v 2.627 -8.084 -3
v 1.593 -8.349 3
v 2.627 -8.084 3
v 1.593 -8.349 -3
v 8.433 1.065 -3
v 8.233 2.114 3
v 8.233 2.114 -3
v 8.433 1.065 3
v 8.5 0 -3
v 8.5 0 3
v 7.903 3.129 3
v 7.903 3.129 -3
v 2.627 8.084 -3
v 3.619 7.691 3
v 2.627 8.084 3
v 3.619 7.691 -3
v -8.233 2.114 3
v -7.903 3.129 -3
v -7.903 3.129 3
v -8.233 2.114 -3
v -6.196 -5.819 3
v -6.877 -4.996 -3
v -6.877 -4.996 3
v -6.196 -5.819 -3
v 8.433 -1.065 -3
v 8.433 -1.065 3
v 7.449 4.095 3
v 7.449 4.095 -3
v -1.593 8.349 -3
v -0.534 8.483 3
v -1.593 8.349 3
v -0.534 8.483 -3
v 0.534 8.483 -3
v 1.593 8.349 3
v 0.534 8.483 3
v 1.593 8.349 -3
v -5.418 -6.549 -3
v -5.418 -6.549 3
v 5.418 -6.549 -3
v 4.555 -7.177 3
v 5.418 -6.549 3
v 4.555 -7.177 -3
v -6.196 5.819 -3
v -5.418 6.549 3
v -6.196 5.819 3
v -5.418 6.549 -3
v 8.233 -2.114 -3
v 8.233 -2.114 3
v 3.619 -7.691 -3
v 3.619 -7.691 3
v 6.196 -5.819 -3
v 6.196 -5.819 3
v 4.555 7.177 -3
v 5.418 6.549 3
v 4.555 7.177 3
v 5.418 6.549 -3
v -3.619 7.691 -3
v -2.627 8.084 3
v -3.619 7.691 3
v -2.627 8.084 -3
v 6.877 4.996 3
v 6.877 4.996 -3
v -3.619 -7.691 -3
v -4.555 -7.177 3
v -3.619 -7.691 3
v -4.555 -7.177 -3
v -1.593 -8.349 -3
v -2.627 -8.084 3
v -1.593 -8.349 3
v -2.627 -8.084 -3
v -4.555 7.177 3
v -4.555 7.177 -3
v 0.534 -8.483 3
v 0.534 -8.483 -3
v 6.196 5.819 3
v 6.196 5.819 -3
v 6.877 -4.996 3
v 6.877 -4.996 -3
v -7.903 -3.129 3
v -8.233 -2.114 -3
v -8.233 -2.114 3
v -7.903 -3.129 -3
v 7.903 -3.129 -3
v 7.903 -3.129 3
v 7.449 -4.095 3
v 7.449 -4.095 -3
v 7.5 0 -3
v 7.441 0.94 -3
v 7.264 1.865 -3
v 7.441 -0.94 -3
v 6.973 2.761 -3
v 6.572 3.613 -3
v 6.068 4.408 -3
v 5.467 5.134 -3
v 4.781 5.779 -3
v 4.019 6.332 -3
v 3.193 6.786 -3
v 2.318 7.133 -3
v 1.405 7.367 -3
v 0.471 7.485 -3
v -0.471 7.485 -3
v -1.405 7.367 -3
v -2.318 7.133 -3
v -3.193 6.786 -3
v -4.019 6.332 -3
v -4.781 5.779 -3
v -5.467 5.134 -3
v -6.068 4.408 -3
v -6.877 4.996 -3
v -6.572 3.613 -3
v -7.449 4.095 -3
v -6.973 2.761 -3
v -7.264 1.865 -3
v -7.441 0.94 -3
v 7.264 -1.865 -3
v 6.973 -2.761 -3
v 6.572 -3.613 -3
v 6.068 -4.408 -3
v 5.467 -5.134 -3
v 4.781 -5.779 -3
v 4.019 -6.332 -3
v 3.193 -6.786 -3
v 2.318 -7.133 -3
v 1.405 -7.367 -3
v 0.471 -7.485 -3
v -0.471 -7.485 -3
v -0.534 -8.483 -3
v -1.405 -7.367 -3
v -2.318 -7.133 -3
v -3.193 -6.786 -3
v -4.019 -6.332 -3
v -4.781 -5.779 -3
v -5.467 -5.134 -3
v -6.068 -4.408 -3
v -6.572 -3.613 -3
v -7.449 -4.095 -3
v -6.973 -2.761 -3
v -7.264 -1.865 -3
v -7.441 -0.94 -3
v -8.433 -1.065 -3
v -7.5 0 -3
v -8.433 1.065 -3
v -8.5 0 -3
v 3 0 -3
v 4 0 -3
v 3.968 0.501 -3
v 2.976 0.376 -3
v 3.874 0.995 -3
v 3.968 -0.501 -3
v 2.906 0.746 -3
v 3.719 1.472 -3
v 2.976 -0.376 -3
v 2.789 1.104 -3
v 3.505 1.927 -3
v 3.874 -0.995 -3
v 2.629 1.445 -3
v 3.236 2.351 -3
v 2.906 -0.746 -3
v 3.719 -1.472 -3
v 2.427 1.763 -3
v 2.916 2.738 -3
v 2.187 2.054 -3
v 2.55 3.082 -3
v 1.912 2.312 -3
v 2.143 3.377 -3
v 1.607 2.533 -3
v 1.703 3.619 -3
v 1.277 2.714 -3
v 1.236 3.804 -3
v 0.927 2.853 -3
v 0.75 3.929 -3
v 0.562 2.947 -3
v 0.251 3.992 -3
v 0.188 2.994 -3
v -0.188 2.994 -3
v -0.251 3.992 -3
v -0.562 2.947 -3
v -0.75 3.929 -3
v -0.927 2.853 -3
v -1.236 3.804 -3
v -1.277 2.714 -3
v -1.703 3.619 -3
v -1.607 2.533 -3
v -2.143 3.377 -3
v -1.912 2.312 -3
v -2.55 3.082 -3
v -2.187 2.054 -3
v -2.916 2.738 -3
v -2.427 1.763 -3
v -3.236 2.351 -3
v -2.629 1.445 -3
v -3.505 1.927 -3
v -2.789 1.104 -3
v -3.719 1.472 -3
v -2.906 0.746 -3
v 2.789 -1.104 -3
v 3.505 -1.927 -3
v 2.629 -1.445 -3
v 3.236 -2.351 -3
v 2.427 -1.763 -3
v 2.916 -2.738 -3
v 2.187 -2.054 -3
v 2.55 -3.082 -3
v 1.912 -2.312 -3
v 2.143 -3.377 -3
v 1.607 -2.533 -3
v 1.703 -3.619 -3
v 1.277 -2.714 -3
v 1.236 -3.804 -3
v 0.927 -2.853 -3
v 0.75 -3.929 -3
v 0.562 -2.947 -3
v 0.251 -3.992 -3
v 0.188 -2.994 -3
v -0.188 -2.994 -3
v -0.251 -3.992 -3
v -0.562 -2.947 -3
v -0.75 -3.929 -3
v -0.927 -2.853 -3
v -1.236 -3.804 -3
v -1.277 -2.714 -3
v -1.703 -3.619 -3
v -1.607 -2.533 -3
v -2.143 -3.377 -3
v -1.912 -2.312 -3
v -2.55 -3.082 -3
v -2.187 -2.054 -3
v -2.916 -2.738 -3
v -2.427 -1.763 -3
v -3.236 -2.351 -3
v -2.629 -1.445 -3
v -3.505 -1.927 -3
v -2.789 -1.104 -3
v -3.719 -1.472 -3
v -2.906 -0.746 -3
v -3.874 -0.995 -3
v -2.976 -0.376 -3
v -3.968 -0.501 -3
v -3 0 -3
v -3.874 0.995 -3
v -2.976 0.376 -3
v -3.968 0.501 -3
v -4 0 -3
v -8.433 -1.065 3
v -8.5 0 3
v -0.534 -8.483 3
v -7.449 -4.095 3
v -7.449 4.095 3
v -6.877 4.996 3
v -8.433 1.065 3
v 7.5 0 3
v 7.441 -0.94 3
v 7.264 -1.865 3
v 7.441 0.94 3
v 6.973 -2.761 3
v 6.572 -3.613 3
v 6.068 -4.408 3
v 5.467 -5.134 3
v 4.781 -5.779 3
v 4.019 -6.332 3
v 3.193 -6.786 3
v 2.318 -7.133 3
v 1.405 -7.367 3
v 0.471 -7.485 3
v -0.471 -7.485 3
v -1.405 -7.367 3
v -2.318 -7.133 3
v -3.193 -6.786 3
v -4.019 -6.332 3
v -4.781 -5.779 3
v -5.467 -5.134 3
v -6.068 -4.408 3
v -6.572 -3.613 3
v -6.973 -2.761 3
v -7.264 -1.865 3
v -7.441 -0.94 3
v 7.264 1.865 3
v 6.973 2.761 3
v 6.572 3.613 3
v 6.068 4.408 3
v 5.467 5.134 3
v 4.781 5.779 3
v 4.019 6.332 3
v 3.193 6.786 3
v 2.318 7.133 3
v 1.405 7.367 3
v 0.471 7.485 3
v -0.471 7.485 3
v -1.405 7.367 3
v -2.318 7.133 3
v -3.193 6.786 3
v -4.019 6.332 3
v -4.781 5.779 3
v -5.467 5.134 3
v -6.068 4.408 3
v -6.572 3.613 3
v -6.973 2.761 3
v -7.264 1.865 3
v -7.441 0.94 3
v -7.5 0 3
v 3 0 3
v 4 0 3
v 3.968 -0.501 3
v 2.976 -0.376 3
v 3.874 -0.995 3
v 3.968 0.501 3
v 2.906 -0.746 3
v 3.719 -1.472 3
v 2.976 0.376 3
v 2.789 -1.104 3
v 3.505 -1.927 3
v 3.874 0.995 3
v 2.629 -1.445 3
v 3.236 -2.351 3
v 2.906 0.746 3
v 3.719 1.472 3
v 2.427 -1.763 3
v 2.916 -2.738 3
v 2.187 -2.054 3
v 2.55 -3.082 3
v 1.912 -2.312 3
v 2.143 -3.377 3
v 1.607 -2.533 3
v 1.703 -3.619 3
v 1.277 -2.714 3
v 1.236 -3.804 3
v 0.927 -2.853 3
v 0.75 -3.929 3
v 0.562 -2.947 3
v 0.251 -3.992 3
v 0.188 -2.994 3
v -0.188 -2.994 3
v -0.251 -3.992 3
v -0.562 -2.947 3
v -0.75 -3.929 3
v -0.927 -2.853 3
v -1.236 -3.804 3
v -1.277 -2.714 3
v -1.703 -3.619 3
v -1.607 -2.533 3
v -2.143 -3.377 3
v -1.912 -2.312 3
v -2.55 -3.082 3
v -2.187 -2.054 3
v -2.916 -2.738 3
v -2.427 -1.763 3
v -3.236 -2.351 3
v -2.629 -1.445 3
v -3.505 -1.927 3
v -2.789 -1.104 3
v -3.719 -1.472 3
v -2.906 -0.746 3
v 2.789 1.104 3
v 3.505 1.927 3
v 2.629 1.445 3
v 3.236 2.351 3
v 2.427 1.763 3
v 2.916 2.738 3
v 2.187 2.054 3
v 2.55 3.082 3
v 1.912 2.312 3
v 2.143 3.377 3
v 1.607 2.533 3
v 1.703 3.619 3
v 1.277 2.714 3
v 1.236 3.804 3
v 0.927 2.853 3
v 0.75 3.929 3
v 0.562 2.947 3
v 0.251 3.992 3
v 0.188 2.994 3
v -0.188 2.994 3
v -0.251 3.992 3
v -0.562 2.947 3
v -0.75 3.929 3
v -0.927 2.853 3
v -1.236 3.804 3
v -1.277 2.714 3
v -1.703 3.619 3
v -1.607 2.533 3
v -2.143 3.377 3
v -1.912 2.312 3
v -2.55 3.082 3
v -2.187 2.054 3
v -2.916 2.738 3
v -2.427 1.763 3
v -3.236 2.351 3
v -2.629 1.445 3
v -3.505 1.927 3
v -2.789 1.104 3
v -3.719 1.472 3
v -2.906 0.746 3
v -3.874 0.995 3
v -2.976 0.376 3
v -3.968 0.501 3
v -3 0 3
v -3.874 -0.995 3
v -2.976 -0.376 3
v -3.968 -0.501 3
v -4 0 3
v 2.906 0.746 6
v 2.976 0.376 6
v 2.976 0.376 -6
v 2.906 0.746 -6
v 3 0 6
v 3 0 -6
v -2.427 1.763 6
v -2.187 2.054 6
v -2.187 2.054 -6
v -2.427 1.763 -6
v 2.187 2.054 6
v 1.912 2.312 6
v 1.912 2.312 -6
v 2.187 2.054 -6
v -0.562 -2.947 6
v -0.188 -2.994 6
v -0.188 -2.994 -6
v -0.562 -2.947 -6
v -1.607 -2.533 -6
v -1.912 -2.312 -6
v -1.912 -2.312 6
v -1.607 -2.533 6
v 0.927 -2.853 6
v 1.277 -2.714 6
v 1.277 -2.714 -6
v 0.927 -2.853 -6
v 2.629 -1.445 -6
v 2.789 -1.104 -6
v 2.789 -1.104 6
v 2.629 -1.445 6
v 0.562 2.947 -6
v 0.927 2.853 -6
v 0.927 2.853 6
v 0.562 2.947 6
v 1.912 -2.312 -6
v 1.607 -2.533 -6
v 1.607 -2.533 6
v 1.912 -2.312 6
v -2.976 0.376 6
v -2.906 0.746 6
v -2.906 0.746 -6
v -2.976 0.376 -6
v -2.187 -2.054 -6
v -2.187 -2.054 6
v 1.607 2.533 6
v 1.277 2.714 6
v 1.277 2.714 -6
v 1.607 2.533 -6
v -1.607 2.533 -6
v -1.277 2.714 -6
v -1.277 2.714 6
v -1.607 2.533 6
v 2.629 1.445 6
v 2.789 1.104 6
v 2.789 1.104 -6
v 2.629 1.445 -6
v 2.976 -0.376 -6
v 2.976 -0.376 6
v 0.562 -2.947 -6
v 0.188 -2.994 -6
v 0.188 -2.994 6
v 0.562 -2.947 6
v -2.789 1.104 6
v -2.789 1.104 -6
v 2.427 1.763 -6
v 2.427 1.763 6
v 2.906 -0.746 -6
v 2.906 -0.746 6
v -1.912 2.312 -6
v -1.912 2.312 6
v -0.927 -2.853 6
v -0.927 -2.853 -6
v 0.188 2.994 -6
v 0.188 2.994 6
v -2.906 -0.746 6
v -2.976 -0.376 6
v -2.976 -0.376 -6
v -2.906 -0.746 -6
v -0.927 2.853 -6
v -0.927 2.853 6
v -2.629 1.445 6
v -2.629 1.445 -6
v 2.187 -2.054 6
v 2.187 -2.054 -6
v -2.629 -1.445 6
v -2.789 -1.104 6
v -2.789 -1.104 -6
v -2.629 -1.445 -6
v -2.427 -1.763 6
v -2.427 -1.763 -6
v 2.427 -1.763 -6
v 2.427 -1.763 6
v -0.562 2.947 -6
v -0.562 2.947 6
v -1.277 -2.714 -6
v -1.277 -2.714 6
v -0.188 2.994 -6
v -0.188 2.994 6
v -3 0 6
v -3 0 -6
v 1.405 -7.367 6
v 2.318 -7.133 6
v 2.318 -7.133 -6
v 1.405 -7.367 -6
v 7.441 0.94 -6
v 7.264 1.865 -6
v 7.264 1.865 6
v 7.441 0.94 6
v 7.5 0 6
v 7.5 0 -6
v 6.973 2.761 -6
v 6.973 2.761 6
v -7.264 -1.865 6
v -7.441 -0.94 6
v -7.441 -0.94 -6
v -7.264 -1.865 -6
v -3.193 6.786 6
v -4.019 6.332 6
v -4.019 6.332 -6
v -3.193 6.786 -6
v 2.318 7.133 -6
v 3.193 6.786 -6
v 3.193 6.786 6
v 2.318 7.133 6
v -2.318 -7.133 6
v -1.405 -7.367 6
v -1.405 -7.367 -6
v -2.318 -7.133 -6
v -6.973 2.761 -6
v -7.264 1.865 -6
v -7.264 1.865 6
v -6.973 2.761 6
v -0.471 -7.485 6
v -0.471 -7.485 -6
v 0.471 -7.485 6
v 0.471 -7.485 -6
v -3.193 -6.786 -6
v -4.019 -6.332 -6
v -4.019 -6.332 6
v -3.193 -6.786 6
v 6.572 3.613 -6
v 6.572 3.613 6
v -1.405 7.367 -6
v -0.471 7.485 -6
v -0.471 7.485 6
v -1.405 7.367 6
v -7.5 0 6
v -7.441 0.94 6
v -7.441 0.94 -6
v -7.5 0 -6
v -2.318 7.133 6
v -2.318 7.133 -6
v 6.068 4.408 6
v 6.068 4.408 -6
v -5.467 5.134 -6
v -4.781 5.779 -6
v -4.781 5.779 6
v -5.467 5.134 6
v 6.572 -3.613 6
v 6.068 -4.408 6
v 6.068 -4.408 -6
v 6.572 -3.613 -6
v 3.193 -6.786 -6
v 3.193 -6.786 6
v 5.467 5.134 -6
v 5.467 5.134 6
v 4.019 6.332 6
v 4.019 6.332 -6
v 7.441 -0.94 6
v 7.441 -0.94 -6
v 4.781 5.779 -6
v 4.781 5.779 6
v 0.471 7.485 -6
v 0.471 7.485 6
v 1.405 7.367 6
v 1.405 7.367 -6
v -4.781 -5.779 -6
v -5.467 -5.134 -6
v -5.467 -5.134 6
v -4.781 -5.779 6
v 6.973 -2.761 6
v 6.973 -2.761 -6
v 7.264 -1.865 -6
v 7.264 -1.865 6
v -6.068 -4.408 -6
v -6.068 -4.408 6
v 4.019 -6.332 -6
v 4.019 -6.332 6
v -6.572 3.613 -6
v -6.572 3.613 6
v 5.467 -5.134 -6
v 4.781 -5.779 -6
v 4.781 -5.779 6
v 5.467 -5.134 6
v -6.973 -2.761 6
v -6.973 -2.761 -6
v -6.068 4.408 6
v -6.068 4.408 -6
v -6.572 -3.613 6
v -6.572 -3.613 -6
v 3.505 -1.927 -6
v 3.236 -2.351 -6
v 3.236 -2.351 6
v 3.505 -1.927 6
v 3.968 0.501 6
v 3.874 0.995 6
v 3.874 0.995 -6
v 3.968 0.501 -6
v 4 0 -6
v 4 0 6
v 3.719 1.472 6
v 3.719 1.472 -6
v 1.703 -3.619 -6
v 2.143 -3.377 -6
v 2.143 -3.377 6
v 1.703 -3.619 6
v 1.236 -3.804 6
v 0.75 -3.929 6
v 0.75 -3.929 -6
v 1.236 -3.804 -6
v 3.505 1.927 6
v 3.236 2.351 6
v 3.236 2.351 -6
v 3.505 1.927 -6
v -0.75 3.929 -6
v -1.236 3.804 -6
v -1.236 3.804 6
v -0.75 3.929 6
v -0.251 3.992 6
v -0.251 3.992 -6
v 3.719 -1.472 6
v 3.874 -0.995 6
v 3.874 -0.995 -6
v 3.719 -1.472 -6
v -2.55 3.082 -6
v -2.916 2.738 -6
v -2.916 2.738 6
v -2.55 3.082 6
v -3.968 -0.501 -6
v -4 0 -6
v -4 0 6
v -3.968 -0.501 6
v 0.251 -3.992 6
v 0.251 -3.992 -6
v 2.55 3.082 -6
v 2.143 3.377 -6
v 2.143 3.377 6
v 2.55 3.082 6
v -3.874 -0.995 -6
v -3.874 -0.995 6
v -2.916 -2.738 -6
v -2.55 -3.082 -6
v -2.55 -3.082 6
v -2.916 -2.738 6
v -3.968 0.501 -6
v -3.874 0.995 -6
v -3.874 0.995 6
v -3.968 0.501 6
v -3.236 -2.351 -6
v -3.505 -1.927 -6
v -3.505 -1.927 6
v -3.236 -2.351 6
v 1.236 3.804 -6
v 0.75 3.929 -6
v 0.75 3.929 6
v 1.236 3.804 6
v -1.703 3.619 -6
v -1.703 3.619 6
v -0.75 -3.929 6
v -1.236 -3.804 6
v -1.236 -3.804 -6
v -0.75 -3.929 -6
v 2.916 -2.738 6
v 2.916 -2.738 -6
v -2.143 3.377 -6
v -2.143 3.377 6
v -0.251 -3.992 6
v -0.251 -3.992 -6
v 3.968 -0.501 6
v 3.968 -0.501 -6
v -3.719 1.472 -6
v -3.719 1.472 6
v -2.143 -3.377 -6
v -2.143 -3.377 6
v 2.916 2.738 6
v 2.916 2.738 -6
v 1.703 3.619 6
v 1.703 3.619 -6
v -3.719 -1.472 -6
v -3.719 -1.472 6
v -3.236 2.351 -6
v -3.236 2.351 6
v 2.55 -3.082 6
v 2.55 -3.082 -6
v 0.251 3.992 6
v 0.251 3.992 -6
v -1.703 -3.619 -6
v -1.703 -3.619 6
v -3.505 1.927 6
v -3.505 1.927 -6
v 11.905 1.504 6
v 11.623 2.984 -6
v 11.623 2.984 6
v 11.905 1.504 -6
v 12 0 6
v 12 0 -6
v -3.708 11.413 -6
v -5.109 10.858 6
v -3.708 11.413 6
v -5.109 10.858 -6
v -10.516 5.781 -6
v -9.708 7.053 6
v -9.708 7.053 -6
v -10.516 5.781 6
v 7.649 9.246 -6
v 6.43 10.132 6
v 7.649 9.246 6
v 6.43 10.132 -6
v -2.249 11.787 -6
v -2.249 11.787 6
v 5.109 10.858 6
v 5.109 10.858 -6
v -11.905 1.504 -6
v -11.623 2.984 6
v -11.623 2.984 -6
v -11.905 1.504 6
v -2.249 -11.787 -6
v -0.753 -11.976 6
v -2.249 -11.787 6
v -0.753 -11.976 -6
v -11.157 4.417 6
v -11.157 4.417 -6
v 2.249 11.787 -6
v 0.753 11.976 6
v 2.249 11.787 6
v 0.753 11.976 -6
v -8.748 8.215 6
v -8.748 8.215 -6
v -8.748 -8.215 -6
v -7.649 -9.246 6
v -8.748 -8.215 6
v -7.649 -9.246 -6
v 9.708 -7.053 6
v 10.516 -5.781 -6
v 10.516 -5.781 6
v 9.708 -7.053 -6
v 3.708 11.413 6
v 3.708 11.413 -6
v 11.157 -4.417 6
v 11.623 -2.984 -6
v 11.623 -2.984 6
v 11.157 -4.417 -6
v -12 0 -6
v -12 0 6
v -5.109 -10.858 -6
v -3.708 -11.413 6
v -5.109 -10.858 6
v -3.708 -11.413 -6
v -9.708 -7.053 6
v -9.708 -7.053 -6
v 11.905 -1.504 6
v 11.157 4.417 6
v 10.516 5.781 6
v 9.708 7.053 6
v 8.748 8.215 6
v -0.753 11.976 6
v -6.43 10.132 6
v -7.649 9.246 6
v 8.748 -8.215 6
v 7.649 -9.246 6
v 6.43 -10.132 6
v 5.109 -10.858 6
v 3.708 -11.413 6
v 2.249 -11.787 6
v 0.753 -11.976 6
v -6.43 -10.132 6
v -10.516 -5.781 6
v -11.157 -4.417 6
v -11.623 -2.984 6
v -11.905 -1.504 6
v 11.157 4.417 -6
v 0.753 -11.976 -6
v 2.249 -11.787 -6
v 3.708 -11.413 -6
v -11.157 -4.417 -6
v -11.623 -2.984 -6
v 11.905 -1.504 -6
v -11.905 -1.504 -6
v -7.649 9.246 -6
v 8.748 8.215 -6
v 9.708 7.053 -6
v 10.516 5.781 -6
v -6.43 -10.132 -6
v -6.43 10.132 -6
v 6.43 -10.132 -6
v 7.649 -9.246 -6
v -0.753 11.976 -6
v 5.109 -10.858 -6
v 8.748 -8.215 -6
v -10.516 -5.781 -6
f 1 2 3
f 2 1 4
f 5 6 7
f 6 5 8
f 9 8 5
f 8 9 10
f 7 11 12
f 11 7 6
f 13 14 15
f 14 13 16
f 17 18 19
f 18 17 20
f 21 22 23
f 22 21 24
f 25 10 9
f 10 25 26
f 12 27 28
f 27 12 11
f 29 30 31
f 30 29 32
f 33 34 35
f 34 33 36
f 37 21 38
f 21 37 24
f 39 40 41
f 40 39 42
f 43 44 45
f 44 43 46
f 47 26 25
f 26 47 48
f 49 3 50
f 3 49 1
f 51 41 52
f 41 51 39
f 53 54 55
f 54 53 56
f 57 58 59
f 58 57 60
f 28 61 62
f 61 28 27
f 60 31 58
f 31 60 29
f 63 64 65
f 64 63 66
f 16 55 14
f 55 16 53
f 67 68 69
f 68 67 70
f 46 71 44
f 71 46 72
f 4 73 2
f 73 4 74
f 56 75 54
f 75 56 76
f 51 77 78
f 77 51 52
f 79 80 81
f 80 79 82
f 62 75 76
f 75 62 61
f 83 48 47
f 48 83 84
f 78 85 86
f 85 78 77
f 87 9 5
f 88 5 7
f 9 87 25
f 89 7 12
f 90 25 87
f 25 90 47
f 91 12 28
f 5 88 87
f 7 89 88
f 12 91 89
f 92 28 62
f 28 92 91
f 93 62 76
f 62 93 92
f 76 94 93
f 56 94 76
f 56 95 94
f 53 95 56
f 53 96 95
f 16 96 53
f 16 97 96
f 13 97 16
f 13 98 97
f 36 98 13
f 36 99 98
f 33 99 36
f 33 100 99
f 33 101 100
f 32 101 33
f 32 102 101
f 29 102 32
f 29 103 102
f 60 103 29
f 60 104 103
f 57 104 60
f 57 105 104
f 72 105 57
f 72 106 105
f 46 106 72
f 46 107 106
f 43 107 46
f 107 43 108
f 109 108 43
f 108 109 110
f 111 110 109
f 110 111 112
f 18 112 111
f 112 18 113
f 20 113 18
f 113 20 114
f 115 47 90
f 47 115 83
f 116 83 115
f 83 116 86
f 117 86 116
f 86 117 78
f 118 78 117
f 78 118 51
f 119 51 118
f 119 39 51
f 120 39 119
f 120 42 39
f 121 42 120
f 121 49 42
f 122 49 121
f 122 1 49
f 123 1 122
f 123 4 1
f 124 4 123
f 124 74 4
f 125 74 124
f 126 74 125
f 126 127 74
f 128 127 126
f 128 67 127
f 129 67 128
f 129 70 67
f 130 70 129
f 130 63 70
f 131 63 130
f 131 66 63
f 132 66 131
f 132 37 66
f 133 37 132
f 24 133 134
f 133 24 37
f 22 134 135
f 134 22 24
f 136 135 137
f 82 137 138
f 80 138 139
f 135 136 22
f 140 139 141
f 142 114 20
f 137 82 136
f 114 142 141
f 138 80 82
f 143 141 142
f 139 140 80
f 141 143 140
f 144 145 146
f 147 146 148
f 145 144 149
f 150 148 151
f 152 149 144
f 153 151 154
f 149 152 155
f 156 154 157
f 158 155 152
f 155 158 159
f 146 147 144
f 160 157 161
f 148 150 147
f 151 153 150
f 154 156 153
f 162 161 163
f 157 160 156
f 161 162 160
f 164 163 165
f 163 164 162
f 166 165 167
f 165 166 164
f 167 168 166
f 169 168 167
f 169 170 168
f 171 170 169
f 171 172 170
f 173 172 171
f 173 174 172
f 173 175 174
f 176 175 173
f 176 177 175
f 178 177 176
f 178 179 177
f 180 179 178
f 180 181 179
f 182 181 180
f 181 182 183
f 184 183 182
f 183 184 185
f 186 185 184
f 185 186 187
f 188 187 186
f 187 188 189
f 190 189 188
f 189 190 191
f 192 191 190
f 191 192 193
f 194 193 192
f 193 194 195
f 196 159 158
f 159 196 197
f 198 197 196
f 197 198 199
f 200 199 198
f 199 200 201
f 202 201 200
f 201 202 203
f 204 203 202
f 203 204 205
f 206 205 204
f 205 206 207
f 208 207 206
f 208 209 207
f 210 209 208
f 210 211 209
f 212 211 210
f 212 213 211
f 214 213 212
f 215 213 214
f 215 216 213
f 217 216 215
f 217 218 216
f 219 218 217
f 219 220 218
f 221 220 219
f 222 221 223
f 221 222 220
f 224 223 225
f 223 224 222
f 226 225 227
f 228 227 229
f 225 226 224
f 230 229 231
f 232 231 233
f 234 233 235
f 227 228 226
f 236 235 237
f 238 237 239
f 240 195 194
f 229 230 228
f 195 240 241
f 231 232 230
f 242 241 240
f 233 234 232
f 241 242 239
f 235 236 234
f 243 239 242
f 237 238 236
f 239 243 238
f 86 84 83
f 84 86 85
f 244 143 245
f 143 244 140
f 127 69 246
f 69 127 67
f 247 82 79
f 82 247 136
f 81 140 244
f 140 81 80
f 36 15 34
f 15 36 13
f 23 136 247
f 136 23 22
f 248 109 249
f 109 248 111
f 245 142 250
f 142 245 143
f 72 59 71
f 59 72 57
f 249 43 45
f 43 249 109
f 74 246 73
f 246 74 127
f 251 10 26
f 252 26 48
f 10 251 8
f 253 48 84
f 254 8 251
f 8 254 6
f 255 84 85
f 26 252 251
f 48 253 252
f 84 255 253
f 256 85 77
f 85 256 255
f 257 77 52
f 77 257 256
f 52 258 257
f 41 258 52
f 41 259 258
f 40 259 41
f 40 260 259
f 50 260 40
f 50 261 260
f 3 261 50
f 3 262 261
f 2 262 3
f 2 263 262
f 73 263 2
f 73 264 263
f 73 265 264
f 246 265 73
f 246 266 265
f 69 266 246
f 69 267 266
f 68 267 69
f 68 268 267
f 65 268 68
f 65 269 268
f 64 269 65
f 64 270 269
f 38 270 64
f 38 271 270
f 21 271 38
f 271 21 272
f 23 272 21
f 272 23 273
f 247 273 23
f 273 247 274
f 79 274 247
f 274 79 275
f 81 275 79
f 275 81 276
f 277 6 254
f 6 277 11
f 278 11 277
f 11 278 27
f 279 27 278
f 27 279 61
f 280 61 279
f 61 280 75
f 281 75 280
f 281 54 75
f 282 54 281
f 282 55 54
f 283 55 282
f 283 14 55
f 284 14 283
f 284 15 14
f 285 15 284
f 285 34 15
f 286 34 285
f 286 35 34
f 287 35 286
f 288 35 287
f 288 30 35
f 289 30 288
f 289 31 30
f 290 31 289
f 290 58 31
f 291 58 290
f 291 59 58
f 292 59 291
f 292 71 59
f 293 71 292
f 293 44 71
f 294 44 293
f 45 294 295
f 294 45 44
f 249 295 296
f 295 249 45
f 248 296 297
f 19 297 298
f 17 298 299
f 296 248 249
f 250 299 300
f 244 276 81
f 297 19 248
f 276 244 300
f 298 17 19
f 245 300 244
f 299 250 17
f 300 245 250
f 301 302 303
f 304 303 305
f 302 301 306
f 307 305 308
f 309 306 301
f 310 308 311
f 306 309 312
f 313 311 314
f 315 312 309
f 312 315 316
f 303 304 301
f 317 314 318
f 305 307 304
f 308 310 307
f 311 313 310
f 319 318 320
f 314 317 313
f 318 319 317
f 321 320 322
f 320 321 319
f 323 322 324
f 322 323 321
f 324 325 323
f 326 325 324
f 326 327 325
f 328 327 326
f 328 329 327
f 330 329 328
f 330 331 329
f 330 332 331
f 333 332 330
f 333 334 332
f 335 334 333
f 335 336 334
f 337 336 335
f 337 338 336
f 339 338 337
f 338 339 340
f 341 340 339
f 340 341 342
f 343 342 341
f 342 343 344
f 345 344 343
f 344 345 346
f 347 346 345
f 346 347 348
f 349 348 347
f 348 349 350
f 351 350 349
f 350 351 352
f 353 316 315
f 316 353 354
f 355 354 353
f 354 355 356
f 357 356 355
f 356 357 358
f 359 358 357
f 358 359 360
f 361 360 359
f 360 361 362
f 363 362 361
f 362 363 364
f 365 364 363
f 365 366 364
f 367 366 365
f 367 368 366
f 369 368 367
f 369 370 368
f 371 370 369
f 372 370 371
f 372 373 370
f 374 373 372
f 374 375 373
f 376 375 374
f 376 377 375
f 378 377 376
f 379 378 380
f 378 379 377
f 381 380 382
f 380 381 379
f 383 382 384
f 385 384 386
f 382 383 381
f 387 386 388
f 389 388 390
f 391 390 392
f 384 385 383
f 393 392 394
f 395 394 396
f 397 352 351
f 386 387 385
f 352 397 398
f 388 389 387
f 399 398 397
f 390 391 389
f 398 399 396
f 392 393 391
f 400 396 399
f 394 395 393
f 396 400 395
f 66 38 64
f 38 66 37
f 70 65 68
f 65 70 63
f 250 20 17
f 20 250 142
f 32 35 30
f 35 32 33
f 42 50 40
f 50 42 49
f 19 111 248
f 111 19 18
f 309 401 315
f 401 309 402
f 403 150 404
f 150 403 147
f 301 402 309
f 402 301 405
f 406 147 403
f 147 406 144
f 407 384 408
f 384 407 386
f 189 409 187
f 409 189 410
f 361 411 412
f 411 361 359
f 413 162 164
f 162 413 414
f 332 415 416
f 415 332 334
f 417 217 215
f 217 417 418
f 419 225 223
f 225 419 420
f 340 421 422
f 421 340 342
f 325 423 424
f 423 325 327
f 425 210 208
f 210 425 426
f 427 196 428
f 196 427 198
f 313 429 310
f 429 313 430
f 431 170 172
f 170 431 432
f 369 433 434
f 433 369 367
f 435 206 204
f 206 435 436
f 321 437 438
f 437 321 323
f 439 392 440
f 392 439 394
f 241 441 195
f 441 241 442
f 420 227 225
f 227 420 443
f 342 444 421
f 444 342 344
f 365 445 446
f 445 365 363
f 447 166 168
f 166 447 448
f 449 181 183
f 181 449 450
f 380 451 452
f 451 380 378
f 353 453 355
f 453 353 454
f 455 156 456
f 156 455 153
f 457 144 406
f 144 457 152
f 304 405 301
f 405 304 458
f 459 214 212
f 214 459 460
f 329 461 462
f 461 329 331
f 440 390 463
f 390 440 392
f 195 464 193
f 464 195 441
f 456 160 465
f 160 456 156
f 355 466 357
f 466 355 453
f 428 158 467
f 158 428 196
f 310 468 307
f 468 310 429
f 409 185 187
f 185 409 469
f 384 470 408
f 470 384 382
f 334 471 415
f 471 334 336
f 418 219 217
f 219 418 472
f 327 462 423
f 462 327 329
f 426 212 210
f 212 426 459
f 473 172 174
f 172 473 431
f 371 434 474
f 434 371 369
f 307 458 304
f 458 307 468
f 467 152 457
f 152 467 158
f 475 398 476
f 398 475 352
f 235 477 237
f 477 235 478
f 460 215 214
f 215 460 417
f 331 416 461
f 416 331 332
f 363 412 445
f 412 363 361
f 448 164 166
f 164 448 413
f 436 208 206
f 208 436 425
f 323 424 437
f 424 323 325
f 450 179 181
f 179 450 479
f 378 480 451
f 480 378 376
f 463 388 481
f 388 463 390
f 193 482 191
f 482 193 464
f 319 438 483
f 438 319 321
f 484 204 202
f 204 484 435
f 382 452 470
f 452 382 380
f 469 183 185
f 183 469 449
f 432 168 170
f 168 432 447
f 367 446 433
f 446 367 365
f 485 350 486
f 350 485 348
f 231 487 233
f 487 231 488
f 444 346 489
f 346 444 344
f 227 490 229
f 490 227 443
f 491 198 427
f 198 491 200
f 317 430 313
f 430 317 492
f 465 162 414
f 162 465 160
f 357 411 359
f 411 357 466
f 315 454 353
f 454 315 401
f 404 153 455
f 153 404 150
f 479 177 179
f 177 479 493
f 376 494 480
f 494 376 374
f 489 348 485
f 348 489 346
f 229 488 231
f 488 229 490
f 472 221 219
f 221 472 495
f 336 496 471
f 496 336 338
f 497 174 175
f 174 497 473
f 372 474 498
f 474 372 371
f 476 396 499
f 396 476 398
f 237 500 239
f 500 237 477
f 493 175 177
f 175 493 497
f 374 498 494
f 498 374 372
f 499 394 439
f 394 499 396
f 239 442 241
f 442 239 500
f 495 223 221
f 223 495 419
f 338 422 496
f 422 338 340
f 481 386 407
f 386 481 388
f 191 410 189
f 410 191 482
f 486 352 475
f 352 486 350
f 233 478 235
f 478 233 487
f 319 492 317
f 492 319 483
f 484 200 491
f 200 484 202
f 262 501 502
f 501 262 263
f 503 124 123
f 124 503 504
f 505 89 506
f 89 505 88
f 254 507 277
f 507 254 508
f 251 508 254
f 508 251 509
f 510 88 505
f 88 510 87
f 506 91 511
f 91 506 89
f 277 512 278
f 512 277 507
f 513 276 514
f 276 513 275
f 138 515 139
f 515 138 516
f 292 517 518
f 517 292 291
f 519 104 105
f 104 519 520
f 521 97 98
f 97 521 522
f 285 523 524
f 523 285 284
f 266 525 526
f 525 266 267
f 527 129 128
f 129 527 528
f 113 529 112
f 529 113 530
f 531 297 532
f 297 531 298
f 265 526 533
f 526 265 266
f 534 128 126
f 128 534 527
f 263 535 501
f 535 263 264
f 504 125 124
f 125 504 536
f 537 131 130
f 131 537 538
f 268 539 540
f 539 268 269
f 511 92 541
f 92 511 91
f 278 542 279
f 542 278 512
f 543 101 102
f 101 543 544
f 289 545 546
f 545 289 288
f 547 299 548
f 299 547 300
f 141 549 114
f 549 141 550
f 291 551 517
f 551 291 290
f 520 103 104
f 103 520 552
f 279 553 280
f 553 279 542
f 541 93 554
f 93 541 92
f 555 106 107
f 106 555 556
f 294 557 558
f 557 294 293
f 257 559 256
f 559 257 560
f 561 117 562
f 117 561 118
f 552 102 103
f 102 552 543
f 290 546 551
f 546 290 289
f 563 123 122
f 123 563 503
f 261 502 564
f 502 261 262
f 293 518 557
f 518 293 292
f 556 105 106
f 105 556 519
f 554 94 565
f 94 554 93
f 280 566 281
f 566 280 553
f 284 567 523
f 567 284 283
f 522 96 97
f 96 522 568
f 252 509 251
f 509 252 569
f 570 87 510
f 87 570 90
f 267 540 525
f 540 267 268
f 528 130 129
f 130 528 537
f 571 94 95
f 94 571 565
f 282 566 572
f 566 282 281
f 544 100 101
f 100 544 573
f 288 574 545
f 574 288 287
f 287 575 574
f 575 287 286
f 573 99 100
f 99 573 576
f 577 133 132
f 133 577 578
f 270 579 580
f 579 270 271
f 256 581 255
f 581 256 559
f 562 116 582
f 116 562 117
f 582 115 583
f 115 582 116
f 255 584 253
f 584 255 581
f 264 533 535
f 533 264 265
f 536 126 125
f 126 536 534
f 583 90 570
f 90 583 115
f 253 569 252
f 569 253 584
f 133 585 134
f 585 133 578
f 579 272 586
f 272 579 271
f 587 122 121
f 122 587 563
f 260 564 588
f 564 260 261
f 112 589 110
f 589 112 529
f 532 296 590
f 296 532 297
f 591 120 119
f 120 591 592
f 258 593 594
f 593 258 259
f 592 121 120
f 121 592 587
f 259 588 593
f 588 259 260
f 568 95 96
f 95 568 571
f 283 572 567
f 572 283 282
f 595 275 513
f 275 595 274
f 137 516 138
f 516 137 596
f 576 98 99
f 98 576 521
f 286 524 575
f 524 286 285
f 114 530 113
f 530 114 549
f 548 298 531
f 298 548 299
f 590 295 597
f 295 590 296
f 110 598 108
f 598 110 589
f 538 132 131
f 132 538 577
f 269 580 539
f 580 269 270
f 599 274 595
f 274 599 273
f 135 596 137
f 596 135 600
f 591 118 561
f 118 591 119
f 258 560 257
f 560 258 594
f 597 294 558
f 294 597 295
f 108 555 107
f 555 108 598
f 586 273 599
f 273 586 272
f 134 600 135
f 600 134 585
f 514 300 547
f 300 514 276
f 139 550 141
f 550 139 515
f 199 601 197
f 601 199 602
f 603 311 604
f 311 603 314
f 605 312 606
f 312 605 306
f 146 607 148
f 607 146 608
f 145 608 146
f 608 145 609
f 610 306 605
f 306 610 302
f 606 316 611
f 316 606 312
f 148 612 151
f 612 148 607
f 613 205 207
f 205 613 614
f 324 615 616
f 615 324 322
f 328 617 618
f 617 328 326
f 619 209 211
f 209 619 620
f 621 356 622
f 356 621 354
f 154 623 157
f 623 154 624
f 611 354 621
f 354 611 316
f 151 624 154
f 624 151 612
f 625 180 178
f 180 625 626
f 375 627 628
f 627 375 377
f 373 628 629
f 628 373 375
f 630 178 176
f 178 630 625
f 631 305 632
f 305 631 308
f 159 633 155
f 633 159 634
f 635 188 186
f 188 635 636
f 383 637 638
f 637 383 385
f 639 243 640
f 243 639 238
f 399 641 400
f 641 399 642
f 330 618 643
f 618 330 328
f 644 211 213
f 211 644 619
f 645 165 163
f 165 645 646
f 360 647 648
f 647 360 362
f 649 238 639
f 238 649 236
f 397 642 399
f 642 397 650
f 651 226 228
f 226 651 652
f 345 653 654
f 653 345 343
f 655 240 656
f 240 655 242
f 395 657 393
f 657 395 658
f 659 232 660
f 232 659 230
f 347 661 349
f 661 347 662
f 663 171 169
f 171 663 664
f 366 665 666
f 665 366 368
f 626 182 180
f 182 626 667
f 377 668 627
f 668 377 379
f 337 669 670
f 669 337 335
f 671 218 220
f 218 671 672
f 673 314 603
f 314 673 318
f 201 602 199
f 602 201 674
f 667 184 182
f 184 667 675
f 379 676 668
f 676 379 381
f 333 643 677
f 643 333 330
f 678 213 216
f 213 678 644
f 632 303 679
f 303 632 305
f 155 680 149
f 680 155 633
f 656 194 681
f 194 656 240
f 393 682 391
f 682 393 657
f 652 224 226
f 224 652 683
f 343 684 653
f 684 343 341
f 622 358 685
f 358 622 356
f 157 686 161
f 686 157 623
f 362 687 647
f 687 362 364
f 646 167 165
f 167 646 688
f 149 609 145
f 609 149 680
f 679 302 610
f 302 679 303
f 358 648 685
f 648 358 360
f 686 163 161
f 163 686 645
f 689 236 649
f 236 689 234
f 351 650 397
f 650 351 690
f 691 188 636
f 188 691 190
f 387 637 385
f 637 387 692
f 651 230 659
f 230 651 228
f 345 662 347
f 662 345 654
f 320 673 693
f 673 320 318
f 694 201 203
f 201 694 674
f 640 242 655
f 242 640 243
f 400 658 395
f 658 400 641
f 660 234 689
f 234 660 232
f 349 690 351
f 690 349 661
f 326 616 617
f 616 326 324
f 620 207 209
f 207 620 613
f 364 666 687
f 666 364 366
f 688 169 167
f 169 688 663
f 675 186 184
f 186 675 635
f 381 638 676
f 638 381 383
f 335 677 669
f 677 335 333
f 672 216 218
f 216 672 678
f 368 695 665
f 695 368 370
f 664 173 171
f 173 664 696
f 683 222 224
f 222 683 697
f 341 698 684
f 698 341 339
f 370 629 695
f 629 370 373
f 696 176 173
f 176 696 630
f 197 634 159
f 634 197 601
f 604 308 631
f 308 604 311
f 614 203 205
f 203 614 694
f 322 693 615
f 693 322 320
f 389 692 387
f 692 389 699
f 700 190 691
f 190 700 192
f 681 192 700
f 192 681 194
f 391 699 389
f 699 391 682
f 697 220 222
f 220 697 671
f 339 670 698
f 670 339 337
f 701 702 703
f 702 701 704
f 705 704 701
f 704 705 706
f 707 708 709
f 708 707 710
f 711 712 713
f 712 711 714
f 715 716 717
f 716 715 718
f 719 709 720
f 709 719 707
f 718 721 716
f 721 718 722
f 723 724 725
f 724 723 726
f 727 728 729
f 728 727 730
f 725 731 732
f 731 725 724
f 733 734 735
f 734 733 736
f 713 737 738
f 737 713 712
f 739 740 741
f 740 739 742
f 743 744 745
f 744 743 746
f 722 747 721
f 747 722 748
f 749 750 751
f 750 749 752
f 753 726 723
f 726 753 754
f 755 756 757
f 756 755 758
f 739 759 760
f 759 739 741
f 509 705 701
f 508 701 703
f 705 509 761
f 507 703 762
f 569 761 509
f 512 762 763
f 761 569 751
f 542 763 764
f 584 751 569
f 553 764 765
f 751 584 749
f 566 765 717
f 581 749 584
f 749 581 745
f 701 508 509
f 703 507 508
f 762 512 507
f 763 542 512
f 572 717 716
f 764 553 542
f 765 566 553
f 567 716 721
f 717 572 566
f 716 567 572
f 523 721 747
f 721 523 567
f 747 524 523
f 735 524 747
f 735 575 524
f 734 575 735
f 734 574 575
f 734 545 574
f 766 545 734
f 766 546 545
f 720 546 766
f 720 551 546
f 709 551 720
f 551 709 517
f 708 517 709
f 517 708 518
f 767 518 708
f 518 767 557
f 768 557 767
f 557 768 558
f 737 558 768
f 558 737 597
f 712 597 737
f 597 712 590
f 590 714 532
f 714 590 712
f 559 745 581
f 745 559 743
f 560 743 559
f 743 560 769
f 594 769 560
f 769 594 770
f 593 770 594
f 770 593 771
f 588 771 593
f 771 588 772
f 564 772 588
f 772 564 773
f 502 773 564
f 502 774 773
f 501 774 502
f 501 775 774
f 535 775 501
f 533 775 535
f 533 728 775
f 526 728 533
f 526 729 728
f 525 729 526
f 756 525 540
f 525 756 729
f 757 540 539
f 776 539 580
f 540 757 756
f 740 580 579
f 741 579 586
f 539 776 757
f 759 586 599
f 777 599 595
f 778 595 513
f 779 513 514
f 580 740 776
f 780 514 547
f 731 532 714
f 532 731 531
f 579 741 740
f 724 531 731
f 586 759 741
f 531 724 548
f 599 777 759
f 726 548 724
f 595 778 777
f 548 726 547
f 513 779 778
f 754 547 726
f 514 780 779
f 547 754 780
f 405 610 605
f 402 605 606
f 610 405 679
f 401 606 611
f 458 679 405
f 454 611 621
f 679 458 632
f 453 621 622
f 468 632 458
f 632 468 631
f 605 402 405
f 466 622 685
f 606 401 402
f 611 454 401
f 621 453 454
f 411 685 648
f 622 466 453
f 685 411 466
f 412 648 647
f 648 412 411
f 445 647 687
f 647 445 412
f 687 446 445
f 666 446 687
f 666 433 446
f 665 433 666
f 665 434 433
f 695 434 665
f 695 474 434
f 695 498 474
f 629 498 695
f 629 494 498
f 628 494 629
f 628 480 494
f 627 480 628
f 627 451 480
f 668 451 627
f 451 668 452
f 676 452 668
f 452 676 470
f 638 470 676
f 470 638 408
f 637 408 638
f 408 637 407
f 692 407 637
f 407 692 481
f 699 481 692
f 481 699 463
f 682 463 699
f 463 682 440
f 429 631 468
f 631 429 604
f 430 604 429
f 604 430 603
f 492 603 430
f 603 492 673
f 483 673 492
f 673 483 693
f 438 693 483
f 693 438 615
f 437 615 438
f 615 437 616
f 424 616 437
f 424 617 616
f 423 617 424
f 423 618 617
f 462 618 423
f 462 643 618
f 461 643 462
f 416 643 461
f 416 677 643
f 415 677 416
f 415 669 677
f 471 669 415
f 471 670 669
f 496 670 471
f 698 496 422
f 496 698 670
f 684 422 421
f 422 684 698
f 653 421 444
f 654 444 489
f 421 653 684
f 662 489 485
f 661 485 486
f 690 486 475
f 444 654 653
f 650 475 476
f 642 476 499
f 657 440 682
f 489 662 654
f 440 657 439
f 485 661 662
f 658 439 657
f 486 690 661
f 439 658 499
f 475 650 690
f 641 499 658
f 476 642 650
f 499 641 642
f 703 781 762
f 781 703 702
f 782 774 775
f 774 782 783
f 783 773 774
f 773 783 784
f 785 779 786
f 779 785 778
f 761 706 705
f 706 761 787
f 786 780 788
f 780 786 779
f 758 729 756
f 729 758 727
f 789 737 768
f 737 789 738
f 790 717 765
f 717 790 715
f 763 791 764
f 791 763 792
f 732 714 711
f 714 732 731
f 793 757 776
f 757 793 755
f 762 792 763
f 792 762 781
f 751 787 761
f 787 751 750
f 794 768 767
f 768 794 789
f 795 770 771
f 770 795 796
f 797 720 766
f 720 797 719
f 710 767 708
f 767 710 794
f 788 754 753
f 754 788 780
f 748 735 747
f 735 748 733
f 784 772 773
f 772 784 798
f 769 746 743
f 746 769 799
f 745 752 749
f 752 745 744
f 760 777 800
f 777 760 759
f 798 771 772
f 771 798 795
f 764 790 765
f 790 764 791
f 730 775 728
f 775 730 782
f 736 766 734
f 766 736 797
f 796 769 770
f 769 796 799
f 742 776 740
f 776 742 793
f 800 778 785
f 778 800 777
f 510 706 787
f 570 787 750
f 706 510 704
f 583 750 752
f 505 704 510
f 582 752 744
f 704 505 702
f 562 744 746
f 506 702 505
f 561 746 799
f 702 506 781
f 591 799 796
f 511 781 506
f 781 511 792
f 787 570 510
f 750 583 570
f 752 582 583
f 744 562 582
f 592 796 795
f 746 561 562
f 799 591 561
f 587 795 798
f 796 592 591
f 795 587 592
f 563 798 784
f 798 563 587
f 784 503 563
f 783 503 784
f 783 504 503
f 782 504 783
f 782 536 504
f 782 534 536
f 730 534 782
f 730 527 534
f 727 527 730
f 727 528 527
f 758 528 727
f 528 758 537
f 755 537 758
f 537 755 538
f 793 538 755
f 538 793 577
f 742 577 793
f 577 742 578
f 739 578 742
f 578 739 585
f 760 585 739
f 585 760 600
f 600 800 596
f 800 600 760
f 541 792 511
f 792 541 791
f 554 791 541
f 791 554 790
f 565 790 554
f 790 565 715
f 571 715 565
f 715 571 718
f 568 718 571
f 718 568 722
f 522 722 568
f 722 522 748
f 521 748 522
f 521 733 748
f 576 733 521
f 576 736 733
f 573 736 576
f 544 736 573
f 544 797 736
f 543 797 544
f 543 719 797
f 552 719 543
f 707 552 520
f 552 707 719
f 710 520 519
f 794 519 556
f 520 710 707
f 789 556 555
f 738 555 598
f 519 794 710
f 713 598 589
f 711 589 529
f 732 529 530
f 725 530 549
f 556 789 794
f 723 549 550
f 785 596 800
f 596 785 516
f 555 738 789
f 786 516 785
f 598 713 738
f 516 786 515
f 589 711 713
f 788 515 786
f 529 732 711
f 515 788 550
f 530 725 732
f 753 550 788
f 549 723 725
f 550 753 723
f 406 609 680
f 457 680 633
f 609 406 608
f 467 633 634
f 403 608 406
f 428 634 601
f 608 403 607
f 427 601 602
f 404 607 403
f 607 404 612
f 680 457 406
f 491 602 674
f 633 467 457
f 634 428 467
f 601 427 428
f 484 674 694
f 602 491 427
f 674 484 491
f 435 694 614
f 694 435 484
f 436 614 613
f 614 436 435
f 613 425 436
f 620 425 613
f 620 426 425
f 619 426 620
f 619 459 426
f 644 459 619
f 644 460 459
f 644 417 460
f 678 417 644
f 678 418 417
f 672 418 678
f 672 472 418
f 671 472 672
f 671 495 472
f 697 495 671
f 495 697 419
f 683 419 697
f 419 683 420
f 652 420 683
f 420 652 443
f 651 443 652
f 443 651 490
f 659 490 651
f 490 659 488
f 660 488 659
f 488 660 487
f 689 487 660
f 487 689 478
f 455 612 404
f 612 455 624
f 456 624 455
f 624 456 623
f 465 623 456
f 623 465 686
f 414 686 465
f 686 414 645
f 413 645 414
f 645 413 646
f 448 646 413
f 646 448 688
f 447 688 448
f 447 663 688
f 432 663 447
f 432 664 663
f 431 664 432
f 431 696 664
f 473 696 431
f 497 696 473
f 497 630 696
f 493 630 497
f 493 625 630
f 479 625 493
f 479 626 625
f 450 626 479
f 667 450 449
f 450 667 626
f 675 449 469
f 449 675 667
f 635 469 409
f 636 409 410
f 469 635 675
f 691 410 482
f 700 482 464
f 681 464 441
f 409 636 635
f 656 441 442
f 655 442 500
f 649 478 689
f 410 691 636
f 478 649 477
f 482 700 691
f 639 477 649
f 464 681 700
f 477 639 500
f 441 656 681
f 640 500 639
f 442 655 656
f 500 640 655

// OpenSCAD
$fn = 50;


difference() {
	union() {
		translate(v = [0, 0, -6.0000000000]) {
			rotate(a = [0, 0, 0]) {
				cylinder(h = 12, r = 12.0000000000);
			}
		}
	}
	union() {
		translate(v = [0, 0, 0]) {
			rotate(a = [0, 0, 0]) {
				translate(v = [0, 0, -3.0000000000]) {
					union() {
						difference() {
							translate(v = [0, 0, 0]) {
								rotate(a = [0, 0, 0]) {
									cylinder(h = 6, r = 8.5000000000);
								}
							}
							translate(v = [0, 0, 0]) {
								rotate(a = [0, 0, 0]) {
									cylinder(h = 6, r = 3.0000000000);
								}
							}
						}
						difference() {
							translate(v = [0, 0, -50]) {
								rotate(a = [0, 0, 0]) {
									cylinder(h = 100, r = 7.5000000000);
								}
							}
							translate(v = [0, 0, -50]) {
								rotate(a = [0, 0, 0]) {
									cylinder(h = 100, r = 4.0000000000);
								}
							}
						}
					}
				}
			}
		}
		translate(v = [-15.0000000000, -15.0000000000, -125.0000000000]) {
			rotate(a = [0, 0, 0]) {
				cylinder(h = 250, r = 3.0000000000);
			}
		}
		translate(v = [-15.0000000000, 15.0000000000, -125.0000000000]) {
			rotate(a = [0, 0, 0]) {
				cylinder(h = 250, r = 3.0000000000);
			}
		}
		translate(v = [15.0000000000, -15.0000000000, -125.0000000000]) {
			rotate(a = [0, 0, 0]) {
				cylinder(h = 250, r = 3.0000000000);
			}
		}
		translate(v = [15.0000000000, 15.0000000000, -125.0000000000]) {
			rotate(a = [0, 0, 0]) {
				cylinder(h = 250, r = 3.0000000000);
			}
		}
		translate(v = [0, 0, -125.0000000000]) {
			rotate(a = [0, 0, 0]) {
				cylinder(h = 250, r = 3.0000000000);
			}
		}
		translate(v = [15.0000000000, 0.0000000000, 4.3000000000]) {
			rotate(a = [0, 0, 15.0000000000]) {
				cylinder(h = 1.7000000000, r1 = 1.5000000000, r2 = 2.9000000000);
			}
		}
		translate(v = [15.0000000000, 0.0000000000, -6.0000000000]) {
			rotate(a = [0, 0, 15.0000000000]) {
				cylinder(h = 12, r = 1.5000000000);
			}
		}
		translate(v = [15.0000000000, 0.0000000000, -6.0000000000]) {
			rotate(a = [0, 0, 15.0000000000]) {
				translate(v = [0, 0, 0]) {
					rotate(a = [0, 0, 15.0000000000]) {
						linear_extrude(height = 2.5000000000) {
							polygon(points = [[3.1735000000, 0.0000000000], [1.5867500000, 2.7483316189], [-1.5867500000, 2.7483316189], [-3.1735000000, 0.0000000000], [-1.5867500000, -2.7483316189], [1.5867500000, -2.7483316189]]);
						}
					}
				}
			}
		}
		translate(v = [0.0000000000, -15.0000000000, -4.3000000000]) {
			rotate(a = [0, 180, 0]) {
				cylinder(h = 1.7000000000, r1 = 1.5000000000, r2 = 2.9000000000);
			}
		}
		translate(v = [0.0000000000, -15.0000000000, 6.0000000000]) {
			rotate(a = [0, 180, 0]) {
				cylinder(h = 12, r = 1.5000000000);
			}
		}
		translate(v = [0.0000000000, -15.0000000000, 3.0000000000]) {
			rotate(a = [0, 180, 0]) {
				translate(v = [0, 0, 0]) {
					rotate(a = [0, 180, 0]) {
						linear_extrude(height = 2.5000000000) {
							polygon(points = [[3.1735000000, 0.0000000000], [1.5867500000, 2.7483316189], [-1.5867500000, 2.7483316189], [-3.1735000000, 0.0000000000], [-1.5867500000, -2.7483316189], [1.5867500000, -2.7483316189]]);
						}
					}
				}
			}
		}
		translate(v = [-15.0000000000, 0.0000000000, 4.3000000000]) {
			rotate(a = [0, 0, 15.0000000000]) {
				cylinder(h = 1.7000000000, r1 = 1.5000000000, r2 = 2.9000000000);
			}
		}
		translate(v = [-15.0000000000, 0.0000000000, -6.0000000000]) {
			rotate(a = [0, 0, 15.0000000000]) {
				cylinder(h = 12, r = 1.5000000000);
			}
		}
		translate(v = [-15.0000000000, 0.0000000000, -6.0000000000]) {
			rotate(a = [0, 0, 15.0000000000]) {
				translate(v = [0, 0, 0]) {
					rotate(a = [0, 0, 15.0000000000]) {
						linear_extrude(height = 2.5000000000) {
							polygon(points = [[3.1735000000, 0.0000000000], [1.5867500000, 2.7483316189], [-1.5867500000, 2.7483316189], [-3.1735000000, 0.0000000000], [-1.5867500000, -2.7483316189], [1.5867500000, -2.7483316189]]);
						}
					}
				}
			}
		}
		translate(v = [0.0000000000, 15.0000000000, -4.3000000000]) {
			rotate(a = [0, 180, 0]) {
				cylinder(h = 1.7000000000, r1 = 1.5000000000, r2 = 2.9000000000);
			}
		}
		translate(v = [0.0000000000, 15.0000000000, 6.0000000000]) {
			rotate(a = [0, 180, 0]) {
				cylinder(h = 12, r = 1.5000000000);
			}
		}
		translate(v = [0.0000000000, 15.0000000000, 3.0000000000]) {
			rotate(a = [0, 180, 0]) {
				translate(v = [0, 0, 0]) {
					rotate(a = [0, 180, 0]) {
						linear_extrude(height = 2.5000000000) {
							polygon(points = [[3.1735000000, 0.0000000000], [1.5867500000, 2.7483316189], [-1.5867500000, 2.7483316189], [-3.1735000000, 0.0000000000], [-1.5867500000, -2.7483316189], [1.5867500000, -2.7483316189]]);
						}
					}
				}
			}
		}
	}
}
